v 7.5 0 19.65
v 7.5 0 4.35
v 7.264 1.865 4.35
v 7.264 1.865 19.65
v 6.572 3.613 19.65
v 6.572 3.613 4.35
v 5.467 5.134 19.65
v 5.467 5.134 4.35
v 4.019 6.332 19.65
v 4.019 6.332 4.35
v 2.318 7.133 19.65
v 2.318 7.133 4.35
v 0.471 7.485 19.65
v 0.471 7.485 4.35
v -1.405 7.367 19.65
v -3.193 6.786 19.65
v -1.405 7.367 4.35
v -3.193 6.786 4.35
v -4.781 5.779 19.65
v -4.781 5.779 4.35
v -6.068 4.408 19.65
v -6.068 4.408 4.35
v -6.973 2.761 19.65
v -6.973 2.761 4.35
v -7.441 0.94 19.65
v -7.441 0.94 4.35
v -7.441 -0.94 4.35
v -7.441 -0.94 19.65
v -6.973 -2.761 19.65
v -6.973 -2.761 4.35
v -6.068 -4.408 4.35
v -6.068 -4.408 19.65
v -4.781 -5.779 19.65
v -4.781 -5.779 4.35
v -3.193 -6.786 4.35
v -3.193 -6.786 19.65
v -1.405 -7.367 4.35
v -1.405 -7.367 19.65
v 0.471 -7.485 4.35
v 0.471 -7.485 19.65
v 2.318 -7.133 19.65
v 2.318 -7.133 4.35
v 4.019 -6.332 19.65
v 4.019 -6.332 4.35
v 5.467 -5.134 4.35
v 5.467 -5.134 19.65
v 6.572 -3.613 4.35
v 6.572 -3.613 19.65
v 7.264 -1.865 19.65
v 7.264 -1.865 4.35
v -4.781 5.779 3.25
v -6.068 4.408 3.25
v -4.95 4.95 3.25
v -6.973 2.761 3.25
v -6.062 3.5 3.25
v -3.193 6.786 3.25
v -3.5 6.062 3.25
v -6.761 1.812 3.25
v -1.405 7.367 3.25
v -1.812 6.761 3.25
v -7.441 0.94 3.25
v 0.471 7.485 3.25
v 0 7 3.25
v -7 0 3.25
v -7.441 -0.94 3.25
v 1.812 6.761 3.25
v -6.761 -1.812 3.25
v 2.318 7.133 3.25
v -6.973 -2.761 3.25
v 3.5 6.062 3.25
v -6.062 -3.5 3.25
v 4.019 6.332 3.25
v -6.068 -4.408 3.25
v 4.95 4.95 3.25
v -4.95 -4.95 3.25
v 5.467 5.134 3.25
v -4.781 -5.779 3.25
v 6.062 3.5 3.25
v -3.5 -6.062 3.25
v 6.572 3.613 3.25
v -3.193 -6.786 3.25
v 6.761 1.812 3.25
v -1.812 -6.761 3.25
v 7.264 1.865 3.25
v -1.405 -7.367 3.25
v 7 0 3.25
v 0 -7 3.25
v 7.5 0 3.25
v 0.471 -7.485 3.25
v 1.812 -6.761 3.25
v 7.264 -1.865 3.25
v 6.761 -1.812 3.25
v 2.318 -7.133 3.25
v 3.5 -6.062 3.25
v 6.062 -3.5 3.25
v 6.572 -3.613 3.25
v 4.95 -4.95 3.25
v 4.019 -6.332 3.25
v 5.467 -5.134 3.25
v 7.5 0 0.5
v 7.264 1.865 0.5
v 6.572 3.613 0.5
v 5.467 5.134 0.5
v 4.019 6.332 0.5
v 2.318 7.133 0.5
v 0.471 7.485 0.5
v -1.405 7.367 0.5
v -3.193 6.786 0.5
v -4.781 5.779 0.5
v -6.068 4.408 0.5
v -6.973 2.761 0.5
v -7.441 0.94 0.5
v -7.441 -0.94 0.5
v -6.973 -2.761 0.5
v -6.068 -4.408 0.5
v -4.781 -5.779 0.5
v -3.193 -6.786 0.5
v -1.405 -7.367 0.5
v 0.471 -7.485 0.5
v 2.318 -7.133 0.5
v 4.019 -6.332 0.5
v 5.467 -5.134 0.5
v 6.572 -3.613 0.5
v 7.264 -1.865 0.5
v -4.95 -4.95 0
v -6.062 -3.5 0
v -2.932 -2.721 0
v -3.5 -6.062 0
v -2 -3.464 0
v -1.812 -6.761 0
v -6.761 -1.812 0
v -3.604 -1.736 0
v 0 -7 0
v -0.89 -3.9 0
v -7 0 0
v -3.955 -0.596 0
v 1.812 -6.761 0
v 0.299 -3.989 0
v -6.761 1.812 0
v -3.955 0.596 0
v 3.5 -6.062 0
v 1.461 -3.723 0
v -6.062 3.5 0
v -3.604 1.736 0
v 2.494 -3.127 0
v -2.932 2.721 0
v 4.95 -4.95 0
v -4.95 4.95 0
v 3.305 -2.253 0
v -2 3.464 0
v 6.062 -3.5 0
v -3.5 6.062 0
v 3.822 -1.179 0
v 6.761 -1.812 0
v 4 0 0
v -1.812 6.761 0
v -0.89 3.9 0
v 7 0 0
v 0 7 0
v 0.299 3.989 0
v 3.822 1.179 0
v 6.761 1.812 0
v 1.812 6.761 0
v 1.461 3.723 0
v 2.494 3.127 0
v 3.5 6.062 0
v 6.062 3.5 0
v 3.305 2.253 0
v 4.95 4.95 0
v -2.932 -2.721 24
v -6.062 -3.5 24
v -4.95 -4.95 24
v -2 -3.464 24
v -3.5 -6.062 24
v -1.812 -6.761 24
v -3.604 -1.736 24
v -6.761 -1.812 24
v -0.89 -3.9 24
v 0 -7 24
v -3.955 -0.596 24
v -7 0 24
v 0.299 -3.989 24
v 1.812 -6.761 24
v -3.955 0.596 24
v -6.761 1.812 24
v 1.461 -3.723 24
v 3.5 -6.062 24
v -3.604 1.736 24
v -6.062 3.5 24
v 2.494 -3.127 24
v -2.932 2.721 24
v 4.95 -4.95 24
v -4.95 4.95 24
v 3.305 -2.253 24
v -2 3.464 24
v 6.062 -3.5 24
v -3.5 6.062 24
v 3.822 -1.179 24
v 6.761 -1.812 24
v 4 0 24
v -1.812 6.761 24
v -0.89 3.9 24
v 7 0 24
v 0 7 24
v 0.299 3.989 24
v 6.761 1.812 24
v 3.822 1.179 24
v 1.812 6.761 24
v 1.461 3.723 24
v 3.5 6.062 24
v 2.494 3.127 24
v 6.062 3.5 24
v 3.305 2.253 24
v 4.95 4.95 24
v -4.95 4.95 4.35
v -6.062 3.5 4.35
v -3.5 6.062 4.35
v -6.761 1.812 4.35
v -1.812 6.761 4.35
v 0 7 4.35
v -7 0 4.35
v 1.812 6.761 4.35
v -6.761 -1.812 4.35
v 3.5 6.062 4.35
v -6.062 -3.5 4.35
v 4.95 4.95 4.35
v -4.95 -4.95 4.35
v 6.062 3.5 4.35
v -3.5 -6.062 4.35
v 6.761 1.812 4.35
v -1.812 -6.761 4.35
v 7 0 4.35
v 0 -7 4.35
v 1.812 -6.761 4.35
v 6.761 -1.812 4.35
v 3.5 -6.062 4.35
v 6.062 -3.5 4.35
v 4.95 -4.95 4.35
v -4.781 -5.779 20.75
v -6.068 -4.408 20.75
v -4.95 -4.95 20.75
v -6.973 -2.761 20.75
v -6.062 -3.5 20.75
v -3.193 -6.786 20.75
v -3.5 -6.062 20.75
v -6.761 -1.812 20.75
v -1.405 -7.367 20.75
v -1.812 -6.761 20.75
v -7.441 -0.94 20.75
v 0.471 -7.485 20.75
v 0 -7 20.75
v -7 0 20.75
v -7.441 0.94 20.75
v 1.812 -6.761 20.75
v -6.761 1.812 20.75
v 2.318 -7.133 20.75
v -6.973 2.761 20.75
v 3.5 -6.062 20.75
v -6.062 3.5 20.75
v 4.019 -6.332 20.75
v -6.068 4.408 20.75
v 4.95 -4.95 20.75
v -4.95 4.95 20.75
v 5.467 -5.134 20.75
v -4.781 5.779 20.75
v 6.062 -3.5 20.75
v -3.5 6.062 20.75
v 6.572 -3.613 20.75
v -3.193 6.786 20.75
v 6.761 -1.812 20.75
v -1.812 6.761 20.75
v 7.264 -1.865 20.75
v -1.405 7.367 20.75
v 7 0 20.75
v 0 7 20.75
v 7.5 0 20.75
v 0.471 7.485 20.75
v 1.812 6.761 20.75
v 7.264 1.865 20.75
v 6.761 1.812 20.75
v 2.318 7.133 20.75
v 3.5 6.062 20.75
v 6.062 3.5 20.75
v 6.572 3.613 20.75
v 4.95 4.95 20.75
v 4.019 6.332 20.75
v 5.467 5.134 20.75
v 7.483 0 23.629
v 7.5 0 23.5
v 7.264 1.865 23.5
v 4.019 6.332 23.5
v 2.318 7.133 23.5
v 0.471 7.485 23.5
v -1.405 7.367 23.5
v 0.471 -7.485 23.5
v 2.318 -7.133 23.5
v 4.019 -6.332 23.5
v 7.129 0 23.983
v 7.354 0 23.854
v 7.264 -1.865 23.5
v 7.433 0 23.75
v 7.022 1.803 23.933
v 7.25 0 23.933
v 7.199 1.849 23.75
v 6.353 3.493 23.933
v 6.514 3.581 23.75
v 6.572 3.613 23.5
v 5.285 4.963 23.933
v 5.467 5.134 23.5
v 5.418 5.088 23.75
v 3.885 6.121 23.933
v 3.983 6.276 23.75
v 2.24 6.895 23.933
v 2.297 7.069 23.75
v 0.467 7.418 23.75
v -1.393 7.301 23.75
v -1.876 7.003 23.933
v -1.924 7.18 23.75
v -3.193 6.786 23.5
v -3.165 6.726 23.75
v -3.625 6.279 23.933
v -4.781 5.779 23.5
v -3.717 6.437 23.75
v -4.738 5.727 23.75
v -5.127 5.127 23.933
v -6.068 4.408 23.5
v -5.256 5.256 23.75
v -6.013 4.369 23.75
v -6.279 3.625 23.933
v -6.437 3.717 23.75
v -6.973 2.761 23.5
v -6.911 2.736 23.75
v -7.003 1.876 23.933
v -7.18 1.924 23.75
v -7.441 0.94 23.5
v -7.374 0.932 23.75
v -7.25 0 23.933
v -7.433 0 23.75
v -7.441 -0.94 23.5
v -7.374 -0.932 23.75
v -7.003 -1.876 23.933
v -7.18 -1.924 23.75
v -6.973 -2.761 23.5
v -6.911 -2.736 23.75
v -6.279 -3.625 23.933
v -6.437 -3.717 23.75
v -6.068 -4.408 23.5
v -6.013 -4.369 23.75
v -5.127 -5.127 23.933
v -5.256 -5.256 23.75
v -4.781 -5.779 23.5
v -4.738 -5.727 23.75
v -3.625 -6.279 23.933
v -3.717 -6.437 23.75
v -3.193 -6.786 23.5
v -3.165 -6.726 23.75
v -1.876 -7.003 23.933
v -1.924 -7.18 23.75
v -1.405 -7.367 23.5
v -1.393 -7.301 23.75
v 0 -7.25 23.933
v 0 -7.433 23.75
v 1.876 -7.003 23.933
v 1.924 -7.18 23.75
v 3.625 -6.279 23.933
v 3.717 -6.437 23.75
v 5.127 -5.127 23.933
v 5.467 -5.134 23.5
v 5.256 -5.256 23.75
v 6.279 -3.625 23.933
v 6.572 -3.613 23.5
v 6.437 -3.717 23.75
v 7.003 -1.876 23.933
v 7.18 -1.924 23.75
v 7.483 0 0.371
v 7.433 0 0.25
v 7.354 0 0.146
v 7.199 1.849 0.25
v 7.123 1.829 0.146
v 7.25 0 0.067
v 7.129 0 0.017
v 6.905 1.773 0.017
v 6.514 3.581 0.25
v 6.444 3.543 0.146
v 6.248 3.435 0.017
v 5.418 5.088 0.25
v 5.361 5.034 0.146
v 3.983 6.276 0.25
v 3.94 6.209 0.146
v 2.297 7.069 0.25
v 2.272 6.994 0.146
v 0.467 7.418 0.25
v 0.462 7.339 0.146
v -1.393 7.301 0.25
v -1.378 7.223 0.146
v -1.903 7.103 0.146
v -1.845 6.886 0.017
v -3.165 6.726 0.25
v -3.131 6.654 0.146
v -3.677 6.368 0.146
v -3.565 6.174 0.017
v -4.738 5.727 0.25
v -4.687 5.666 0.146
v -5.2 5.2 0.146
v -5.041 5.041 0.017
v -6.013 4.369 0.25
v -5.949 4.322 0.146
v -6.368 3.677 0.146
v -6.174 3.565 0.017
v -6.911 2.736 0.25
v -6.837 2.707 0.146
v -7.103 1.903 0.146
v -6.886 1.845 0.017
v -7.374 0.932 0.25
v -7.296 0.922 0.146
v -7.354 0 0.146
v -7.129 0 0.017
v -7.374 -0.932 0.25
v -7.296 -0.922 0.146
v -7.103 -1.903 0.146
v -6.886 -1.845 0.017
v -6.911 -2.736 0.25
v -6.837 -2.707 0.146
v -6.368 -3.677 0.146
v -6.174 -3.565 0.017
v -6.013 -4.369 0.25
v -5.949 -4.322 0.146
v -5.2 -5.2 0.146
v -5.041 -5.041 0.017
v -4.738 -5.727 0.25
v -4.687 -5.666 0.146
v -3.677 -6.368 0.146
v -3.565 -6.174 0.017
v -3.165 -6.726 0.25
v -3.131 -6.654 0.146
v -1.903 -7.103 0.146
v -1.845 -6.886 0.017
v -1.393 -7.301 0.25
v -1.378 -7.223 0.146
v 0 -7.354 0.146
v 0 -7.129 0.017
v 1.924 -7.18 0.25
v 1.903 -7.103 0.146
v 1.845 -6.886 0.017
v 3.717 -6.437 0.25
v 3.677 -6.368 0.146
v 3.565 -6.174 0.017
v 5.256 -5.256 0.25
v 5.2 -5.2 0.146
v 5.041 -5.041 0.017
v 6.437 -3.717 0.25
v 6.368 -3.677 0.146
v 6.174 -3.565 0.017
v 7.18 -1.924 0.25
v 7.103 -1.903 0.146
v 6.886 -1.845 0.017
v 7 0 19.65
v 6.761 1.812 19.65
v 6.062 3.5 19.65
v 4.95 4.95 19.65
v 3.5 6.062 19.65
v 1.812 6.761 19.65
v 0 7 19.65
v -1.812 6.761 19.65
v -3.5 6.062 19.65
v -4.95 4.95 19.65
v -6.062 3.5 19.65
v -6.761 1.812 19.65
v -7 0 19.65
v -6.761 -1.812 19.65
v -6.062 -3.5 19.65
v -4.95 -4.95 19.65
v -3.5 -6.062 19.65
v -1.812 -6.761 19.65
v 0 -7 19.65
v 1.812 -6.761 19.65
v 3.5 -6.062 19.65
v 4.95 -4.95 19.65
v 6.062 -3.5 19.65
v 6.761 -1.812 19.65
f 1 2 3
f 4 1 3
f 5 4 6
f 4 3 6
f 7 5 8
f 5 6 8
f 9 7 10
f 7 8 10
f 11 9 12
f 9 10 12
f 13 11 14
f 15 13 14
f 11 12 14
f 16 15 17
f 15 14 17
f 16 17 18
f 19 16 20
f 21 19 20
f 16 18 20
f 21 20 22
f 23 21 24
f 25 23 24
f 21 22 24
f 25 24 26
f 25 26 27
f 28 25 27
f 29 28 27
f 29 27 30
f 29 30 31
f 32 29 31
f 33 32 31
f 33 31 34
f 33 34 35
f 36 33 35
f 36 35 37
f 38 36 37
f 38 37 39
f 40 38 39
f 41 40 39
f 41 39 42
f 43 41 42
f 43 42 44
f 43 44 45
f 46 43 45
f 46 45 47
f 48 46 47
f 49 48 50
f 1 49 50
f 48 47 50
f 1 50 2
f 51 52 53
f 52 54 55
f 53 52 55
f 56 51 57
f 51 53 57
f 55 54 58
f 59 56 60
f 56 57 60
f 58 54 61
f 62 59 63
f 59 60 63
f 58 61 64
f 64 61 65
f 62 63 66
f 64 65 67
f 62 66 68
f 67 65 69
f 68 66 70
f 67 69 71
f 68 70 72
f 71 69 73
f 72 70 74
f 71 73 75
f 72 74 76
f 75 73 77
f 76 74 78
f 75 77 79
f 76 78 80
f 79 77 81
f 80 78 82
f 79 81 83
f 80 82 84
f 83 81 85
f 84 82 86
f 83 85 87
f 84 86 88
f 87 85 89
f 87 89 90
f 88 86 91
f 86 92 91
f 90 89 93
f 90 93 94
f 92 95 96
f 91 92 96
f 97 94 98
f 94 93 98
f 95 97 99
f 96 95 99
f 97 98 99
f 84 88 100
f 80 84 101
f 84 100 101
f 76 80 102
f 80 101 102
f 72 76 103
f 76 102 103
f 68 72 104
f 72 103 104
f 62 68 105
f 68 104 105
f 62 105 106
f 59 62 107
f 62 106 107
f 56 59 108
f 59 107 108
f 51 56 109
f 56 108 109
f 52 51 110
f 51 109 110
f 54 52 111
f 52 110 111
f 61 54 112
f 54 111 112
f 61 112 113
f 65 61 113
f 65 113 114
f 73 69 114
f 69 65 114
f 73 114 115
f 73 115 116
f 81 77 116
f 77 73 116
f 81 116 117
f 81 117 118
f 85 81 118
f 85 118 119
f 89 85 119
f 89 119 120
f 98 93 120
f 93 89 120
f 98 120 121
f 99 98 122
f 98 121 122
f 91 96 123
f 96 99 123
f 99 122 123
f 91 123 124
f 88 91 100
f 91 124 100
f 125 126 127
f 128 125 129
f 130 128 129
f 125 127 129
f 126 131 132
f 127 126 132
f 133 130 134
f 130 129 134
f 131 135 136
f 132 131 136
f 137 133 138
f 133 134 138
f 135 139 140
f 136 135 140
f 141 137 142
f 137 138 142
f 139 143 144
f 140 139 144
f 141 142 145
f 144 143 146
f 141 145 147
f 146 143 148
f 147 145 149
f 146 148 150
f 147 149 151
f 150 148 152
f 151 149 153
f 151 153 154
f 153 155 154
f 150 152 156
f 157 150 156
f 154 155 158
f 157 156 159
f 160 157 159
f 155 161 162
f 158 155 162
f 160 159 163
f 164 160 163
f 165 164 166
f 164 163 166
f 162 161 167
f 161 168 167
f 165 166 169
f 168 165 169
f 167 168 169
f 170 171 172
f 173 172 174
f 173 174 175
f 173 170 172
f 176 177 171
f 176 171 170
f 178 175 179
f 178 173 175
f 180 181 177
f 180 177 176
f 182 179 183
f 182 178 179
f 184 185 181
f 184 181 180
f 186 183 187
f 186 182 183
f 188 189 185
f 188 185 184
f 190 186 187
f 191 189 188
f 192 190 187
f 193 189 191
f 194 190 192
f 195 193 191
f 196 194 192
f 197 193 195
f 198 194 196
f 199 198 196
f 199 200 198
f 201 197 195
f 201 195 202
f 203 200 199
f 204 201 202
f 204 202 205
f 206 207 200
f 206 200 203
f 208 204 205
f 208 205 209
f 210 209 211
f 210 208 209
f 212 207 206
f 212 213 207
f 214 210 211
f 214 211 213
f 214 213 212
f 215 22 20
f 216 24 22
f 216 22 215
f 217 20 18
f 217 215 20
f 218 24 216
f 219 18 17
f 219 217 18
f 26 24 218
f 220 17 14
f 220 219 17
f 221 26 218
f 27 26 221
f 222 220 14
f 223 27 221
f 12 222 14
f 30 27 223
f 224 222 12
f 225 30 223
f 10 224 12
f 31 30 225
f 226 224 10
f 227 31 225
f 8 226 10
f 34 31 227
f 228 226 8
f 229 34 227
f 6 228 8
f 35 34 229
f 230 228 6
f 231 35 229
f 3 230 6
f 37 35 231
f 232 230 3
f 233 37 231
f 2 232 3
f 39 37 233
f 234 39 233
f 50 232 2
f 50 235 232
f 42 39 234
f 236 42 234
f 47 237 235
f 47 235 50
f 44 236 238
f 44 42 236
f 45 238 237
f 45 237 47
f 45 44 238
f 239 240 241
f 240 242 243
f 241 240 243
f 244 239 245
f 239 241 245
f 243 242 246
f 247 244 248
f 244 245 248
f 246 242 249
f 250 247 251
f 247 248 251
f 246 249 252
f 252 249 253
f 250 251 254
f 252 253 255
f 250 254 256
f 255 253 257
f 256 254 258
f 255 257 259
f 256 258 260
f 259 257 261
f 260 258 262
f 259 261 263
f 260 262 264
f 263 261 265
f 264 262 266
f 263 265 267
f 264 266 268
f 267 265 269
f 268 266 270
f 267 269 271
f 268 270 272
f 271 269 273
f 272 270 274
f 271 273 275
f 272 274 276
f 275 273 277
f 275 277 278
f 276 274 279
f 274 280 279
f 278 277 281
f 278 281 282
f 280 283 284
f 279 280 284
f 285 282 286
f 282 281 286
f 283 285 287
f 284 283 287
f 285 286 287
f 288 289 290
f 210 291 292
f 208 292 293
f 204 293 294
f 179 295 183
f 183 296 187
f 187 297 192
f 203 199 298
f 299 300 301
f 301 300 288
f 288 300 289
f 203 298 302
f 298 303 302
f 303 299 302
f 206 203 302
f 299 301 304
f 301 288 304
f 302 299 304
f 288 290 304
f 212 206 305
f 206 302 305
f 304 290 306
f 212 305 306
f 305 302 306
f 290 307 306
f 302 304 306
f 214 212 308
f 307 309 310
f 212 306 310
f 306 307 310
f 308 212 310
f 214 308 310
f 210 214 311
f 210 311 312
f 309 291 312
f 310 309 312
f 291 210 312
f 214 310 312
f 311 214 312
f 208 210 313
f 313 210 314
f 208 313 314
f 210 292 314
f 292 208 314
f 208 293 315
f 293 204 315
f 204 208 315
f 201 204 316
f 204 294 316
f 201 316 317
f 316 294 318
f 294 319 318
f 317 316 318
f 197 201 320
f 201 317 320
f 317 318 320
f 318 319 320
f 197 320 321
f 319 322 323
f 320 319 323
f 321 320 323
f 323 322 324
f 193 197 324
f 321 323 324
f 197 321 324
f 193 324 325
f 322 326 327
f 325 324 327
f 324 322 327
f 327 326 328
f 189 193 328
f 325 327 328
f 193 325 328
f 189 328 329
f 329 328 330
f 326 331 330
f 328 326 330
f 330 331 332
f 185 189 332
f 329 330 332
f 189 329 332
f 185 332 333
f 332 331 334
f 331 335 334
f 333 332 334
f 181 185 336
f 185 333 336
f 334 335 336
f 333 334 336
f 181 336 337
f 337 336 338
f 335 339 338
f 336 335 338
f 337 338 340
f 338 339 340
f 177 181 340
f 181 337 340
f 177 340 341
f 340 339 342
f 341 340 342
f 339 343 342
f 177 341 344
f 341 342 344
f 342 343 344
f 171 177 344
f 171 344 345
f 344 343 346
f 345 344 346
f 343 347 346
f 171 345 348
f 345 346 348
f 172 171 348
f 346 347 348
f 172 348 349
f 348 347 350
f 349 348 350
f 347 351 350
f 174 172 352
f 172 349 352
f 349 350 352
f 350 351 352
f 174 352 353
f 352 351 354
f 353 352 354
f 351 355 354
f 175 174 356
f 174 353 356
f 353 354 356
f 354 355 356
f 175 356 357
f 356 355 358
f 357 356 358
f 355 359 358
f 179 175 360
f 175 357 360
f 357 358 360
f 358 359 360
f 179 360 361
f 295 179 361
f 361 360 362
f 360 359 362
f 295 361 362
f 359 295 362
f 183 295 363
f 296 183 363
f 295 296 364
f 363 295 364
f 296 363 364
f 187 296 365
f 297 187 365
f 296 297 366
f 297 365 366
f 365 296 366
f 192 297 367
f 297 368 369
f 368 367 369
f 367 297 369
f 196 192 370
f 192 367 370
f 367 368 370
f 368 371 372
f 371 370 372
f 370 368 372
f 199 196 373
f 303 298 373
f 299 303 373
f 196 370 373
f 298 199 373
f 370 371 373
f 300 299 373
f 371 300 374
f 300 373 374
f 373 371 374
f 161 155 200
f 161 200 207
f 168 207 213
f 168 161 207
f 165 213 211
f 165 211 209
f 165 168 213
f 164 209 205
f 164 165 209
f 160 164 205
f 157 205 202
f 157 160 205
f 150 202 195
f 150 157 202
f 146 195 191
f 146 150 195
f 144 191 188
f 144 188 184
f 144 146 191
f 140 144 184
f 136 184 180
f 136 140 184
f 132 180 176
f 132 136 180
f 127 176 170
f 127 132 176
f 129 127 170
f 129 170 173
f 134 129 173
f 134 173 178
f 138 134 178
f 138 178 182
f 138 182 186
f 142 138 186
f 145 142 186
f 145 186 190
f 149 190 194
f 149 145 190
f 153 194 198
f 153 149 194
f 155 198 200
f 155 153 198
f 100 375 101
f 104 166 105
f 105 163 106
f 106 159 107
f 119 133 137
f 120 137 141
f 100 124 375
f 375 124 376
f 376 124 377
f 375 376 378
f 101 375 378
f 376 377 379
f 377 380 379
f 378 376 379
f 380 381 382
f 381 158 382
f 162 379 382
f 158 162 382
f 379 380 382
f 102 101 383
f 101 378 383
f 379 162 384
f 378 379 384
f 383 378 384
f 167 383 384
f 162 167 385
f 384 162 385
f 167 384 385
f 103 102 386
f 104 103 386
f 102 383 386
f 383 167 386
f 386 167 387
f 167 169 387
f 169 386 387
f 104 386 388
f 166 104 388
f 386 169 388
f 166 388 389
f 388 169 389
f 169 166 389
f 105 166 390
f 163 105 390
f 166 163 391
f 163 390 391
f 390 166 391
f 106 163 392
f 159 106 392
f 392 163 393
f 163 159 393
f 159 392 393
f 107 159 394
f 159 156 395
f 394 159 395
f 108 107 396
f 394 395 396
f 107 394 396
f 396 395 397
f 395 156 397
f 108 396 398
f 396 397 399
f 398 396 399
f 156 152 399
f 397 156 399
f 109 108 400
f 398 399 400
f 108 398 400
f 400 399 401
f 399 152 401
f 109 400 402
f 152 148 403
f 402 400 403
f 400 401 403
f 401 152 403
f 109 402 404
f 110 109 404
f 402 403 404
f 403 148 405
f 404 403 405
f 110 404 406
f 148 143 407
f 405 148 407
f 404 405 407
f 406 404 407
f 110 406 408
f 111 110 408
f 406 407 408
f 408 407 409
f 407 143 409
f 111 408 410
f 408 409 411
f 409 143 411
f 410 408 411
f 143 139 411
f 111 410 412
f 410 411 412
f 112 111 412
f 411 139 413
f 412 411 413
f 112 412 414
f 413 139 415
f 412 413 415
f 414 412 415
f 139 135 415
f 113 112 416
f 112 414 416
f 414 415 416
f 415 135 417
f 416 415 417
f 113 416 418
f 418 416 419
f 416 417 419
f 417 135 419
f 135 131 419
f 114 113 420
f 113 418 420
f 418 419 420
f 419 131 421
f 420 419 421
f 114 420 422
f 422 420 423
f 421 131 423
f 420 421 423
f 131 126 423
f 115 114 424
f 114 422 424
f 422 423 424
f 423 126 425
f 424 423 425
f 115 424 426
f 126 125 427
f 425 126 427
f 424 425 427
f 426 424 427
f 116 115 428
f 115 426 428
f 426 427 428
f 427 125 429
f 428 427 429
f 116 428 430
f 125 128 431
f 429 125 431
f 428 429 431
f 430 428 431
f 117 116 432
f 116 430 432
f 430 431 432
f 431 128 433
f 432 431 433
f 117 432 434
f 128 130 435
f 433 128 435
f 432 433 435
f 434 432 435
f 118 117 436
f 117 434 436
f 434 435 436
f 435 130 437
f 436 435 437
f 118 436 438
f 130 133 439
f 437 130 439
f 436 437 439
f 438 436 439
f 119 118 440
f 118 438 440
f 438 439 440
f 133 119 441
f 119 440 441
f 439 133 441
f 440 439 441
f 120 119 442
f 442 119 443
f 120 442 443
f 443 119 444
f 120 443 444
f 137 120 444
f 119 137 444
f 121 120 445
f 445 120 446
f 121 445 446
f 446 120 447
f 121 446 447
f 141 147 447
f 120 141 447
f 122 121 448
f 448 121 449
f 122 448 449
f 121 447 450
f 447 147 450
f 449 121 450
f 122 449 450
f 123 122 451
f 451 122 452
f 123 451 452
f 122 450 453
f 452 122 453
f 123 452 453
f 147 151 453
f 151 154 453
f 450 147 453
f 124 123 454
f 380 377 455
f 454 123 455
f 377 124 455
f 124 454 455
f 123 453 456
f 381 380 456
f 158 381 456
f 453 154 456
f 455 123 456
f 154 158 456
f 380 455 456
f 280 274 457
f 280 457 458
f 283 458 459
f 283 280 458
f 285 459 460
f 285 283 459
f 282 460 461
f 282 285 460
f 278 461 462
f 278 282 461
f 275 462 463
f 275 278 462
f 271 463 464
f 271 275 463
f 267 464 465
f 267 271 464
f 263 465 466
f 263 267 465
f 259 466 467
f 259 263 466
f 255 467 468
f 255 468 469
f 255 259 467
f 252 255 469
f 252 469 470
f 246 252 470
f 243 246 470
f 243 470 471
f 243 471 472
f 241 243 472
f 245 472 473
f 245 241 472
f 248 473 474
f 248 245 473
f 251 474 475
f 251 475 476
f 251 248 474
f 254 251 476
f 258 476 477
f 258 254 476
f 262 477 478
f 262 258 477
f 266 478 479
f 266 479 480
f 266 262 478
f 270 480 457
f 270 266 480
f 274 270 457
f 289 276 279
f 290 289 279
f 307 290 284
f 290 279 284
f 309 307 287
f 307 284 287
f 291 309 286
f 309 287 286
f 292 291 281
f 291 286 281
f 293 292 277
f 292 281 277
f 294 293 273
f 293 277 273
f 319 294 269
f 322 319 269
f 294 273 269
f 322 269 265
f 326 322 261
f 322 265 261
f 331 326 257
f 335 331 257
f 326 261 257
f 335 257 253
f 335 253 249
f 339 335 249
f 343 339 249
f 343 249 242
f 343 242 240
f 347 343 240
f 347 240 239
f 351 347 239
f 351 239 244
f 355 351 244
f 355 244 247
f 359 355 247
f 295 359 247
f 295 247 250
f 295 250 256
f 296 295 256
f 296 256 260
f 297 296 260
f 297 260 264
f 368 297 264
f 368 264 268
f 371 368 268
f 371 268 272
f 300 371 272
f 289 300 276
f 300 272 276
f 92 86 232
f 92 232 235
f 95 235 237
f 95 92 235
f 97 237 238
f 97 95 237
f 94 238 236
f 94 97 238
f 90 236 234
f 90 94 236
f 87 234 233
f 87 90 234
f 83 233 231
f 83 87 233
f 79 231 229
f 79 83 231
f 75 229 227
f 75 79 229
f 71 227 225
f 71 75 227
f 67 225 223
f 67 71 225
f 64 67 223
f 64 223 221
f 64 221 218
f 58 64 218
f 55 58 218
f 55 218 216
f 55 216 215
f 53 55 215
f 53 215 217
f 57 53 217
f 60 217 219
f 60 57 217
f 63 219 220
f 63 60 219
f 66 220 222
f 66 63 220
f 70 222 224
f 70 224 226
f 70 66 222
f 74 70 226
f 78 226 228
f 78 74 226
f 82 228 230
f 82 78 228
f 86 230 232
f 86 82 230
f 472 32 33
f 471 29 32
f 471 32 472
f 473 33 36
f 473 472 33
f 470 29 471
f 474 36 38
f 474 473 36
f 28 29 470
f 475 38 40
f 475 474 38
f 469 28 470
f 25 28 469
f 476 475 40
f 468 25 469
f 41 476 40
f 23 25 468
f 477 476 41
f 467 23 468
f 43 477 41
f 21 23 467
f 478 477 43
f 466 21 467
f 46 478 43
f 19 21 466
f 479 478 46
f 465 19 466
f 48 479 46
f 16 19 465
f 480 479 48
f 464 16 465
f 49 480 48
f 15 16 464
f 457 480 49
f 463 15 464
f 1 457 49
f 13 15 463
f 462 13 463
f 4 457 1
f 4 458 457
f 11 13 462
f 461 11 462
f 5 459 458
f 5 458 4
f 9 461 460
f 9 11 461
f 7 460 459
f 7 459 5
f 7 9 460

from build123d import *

# Parameters (mm, degrees)
F0_R     = 7.5
F0_R_2   = 4
F1_DEPTH = 24
F4_R     = 7.5
F4_R_2   = 7
F5_DEPTH = 1.1
F6_R     = 7.5
F6_R_2   = 7
F7_DEPTH = 1.1
F8_R     = 0.5


with BuildPart() as f1:
    # F0 (on Top) → F1 (new body)
    with BuildSketch(Plane.XY):
        Circle(F0_R)
        Circle(F0_R_2, mode=Mode.SUBTRACT)
    extrude(amount=F1_DEPTH)

    # F4 (on offset) → F5 (cut)
    with BuildSketch(Plane(origin=(0, 0, 3.25), x_dir=(1, 0, 0), z_dir=(0, 0, -1))):
        Circle(F4_R)
        Circle(F4_R_2, mode=Mode.SUBTRACT)
    extrude(amount=-F5_DEPTH, mode=Mode.SUBTRACT)

    # F6 (on offset) → F7 (cut)
    with BuildSketch(Plane.XY.offset(20.75)):
        Circle(F6_R)
        Circle(F6_R_2, mode=Mode.SUBTRACT)
    extrude(amount=-F7_DEPTH, mode=Mode.SUBTRACT)

    # F8
    f8_edges = [f1.edges().sort_by_distance(p)[0] for p in [
        (-7.5, 0, 24),
        (-7.5, 0, 0),
    ]]
    fillet(f8_edges, radius=F8_R)


solid = f1.part
